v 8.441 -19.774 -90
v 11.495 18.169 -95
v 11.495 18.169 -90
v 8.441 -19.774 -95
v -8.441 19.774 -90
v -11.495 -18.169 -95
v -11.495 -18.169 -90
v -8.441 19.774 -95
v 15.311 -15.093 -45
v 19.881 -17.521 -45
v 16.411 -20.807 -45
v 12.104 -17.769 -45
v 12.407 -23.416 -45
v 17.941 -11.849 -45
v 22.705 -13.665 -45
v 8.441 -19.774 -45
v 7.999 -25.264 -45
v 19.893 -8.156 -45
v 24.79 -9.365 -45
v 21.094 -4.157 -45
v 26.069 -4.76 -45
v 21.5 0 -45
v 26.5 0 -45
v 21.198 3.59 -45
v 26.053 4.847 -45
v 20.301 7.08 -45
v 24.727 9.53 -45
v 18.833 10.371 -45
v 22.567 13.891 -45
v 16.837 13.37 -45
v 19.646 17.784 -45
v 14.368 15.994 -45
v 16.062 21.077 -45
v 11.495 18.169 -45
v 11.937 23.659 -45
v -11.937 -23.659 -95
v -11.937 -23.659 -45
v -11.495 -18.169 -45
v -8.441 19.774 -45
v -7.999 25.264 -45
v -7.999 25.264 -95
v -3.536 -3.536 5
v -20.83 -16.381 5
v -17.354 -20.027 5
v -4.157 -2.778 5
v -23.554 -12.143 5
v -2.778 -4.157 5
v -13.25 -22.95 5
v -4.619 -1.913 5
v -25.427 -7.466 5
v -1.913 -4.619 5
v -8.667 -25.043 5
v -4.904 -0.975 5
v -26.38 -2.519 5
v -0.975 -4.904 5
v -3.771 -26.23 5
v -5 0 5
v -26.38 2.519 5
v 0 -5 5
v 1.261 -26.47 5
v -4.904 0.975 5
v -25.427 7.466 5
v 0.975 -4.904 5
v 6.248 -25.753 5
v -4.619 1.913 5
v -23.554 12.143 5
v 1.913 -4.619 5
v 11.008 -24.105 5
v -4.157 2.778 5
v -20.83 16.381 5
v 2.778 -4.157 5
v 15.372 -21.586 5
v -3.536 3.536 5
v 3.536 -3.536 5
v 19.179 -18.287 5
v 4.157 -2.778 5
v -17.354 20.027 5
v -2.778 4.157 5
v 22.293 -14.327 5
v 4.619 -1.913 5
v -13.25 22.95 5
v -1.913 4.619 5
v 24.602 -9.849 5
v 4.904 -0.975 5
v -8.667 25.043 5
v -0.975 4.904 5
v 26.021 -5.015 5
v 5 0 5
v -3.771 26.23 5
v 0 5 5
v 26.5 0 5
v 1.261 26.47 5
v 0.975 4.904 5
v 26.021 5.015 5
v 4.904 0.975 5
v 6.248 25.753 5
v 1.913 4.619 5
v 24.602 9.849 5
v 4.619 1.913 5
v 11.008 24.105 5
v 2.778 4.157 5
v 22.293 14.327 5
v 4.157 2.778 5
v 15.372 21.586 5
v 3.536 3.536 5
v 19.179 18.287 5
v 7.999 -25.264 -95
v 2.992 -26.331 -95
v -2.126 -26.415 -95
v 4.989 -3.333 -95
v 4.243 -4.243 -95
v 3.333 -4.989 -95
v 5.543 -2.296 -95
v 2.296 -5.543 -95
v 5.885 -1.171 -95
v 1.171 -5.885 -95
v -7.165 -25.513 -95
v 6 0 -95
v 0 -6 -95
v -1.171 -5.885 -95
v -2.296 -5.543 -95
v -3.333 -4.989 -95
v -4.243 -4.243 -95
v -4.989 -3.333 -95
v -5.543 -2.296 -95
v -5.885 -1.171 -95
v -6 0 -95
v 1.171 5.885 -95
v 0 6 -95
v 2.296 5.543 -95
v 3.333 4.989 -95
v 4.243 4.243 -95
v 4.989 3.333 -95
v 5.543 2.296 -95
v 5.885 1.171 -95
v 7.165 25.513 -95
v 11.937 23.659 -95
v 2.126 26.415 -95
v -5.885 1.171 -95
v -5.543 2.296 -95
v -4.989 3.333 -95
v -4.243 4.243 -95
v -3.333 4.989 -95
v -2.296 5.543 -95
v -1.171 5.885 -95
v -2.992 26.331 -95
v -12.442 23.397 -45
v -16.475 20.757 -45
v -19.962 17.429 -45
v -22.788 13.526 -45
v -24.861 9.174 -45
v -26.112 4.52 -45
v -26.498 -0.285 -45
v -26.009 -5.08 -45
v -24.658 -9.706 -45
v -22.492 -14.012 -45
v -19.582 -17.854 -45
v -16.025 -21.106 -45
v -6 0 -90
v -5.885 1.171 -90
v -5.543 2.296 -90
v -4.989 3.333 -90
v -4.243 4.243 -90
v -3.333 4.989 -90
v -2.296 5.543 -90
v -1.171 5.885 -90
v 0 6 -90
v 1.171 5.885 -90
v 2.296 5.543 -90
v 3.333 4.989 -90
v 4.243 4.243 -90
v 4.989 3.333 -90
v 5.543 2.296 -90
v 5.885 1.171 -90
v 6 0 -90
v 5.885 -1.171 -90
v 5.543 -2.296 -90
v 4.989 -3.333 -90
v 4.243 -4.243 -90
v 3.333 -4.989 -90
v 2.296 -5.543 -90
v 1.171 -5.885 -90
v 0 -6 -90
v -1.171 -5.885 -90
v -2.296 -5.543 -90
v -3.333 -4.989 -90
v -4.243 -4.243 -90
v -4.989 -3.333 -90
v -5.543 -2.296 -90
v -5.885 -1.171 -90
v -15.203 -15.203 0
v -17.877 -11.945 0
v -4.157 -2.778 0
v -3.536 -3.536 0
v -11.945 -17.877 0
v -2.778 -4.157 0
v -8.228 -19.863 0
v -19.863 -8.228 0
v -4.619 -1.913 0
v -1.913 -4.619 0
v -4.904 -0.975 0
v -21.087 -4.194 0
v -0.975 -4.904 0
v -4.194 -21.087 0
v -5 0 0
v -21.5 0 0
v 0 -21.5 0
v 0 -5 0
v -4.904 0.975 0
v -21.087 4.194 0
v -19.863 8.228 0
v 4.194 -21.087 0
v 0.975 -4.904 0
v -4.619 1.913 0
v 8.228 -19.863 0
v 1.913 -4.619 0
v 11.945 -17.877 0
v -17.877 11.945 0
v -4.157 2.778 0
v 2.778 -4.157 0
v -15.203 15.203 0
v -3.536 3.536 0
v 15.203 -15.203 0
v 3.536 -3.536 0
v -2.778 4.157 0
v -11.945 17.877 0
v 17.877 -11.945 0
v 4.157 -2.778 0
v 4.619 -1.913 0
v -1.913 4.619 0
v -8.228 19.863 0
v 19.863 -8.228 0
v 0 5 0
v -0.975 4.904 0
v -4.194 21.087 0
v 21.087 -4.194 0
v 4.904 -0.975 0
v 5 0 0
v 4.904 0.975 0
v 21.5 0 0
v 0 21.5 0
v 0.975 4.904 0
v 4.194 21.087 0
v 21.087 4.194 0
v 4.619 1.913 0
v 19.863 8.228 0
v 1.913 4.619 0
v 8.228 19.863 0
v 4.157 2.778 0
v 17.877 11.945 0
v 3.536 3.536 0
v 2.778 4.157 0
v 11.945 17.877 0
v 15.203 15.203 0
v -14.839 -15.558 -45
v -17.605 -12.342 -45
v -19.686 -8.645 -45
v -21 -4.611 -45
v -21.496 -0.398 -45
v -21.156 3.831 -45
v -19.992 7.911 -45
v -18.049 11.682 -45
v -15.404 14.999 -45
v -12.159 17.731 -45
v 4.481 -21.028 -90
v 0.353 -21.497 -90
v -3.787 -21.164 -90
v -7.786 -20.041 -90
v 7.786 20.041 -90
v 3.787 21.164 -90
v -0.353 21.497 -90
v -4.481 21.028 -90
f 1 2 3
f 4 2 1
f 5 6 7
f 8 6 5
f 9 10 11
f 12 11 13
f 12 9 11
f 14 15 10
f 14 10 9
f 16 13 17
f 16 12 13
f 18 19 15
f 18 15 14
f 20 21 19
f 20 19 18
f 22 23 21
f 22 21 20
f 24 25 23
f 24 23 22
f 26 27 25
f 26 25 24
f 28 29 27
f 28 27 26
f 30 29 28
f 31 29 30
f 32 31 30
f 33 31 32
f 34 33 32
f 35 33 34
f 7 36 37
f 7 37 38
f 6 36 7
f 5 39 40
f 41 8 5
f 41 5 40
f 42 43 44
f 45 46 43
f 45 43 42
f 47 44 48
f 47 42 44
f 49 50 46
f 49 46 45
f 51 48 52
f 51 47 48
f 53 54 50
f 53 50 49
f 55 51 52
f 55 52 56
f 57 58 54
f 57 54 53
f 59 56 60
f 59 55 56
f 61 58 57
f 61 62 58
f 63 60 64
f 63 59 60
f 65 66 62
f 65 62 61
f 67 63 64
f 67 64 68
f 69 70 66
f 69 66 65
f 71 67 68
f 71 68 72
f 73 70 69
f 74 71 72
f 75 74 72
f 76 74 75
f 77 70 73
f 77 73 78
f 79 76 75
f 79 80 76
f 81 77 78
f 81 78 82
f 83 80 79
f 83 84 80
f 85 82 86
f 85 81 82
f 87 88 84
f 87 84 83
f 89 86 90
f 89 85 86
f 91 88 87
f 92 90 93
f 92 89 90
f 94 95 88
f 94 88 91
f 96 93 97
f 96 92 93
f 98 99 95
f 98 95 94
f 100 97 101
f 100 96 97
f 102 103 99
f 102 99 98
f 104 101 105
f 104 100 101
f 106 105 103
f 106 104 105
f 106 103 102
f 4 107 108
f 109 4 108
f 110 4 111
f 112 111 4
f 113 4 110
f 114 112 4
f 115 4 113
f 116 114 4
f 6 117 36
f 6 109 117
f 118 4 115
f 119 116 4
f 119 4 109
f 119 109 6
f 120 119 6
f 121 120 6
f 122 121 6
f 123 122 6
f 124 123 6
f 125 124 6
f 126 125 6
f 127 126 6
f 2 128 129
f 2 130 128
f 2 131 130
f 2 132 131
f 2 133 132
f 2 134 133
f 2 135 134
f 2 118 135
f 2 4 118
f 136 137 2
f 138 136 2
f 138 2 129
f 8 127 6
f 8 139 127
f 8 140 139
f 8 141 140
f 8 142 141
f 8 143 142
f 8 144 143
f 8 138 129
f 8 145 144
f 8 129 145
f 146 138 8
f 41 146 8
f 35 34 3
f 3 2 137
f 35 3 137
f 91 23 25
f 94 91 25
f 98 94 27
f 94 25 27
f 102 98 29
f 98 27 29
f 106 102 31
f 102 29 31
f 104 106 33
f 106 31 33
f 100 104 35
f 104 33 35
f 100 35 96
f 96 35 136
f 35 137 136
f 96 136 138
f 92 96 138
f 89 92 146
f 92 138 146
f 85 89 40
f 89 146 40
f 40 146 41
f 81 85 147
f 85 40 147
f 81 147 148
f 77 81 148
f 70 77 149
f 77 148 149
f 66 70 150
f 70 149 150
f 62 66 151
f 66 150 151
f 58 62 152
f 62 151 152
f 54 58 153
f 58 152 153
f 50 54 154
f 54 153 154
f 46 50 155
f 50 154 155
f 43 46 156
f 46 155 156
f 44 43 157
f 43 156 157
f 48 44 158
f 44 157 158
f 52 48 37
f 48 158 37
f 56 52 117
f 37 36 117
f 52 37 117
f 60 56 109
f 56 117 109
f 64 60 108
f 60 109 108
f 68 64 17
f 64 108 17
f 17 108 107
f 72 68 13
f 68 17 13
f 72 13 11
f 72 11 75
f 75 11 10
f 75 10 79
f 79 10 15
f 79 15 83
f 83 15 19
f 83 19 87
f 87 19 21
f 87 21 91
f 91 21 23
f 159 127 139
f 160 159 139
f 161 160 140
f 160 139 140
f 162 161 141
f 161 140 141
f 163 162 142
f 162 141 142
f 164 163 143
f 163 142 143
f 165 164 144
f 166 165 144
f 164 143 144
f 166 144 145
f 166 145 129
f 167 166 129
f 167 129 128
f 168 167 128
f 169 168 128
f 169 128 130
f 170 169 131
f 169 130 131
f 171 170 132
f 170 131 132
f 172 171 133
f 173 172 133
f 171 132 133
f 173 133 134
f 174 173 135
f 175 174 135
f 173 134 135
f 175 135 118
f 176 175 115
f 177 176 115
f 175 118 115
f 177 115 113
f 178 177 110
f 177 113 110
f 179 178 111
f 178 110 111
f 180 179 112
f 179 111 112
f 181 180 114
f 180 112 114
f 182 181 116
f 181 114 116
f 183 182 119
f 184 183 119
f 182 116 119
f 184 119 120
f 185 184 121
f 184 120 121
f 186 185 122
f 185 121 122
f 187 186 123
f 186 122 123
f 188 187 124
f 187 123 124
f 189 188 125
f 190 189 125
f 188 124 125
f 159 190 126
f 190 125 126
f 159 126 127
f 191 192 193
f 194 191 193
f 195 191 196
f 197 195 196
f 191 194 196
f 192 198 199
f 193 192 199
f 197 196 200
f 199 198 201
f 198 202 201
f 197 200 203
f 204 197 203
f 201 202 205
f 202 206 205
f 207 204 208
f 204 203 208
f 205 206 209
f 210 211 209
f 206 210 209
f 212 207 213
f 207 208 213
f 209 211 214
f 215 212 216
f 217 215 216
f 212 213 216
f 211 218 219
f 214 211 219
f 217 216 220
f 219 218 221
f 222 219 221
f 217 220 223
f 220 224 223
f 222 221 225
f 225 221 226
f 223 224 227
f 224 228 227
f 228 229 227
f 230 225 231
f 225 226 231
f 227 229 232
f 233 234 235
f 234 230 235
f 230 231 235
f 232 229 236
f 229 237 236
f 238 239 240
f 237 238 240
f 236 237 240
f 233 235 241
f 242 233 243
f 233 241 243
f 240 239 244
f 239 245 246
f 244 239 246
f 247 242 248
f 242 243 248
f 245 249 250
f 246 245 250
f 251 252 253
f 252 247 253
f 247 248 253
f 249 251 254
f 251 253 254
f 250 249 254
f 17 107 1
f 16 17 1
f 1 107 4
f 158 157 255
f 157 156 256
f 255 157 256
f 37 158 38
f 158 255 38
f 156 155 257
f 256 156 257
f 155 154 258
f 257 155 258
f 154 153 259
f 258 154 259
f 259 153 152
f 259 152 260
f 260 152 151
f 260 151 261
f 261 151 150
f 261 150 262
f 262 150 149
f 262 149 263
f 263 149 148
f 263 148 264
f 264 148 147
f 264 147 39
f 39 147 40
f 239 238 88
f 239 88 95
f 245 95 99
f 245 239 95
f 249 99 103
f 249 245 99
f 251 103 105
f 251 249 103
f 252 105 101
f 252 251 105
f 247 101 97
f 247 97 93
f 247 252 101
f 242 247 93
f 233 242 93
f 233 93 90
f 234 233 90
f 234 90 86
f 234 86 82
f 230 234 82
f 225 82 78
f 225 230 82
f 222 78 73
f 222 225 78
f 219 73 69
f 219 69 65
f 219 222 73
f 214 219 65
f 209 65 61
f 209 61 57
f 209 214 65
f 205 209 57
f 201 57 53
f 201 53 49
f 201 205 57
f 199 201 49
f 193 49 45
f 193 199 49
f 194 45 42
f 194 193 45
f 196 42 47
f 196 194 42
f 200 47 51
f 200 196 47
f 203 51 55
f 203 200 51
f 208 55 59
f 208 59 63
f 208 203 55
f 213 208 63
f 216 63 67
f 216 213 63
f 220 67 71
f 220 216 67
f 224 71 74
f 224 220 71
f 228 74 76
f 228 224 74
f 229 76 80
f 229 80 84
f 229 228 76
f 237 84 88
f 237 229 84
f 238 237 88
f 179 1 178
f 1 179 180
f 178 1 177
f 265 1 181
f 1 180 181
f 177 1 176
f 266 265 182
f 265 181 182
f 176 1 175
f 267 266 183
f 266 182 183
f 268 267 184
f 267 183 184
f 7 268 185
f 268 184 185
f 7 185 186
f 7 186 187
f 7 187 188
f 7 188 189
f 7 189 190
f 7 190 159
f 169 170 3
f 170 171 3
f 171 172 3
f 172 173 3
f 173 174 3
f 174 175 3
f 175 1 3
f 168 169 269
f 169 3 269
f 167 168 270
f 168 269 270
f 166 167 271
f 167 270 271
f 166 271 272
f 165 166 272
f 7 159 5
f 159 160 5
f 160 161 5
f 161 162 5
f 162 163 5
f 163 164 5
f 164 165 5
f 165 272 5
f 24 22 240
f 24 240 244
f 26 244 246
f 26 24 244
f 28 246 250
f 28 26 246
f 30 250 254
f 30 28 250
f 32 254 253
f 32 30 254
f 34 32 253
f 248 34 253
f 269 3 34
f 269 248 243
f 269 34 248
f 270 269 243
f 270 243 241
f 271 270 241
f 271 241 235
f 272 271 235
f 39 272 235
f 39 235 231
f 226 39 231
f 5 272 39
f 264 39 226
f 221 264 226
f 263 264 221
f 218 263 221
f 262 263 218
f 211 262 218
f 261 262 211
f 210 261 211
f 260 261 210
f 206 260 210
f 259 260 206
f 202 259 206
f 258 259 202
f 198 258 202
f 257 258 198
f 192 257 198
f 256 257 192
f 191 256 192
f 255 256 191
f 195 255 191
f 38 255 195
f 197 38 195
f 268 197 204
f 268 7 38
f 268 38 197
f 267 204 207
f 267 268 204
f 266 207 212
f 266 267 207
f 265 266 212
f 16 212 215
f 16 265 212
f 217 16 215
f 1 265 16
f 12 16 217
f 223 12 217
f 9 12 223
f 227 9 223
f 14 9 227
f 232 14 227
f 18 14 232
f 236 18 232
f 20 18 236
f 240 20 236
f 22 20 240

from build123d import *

# Parameters (mm, degrees)
SKETCH1_R           = 21.5
SKETCH1_R_2         = 5
BOSS_EXTRUDE1_DEPTH = 5
EXTRUDE_THIN1_START = -100
SKETCH2_R           = 26.5
SKETCH2_R_2         = 21.5
EXTRUDE_THIN1_DEPTH = 100
CUT_EXTRUDE1_DEPTH  = 50
BOSS_EXTRUDE2_DEPTH = 5
SKETCH5_R           = 6
CUT_EXTRUDE2_DEPTH  = 5


with BuildPart() as part:
    # Sketch1 → Boss-Extrude1 (new body)
    with BuildSketch(Plane.XY):
        Circle(SKETCH1_R)
        Circle(SKETCH1_R_2, mode=Mode.SUBTRACT)
    extrude(amount=BOSS_EXTRUDE1_DEPTH)

    # Sketch2 → Extrude-Thin1 (add)
    with BuildSketch(Plane.XY.offset(5).offset(EXTRUDE_THIN1_START)):
        Circle(SKETCH2_R)
        Circle(SKETCH2_R_2, mode=Mode.SUBTRACT)
    extrude(amount=EXTRUDE_THIN1_DEPTH)

    # Sketch3 → Cut-Extrude1 (cut)
    with BuildSketch(Plane(origin=(0, 0, -95), x_dir=(-1, 0, 0), z_dir=(0, 0, -1))):
        with BuildLine():
            Line((11.936744149, -23.659335137), (11.494827009, -18.169175876))
            ThreePointArc((11.494827009, -18.169175876), (21.430686769, 1.725011487), (8.440695566, 19.773837725))
            Line((8.440695566, 19.773837725), (7.998778427, 25.263996985))
            ThreePointArc((7.998778427, 25.263996985), (26.414567412, 2.126176949), (11.936744149, -23.659335137))
        make_face()
        with BuildLine():
            Line((-11.494827009, 18.169175876), (-11.936744149, 23.659335137))
            ThreePointArc((-11.936744149, 23.659335137), (-26.414567412, -2.126176949), (-7.998778427, -25.263996985))
            Line((-7.998778427, -25.263996985), (-8.440695566, -19.773837725))
            ThreePointArc((-8.440695566, -19.773837725), (-21.430686769, -1.725011487), (-11.494827009, 18.169175876))
        make_face()
    extrude(amount=-CUT_EXTRUDE1_DEPTH, mode=Mode.SUBTRACT)

    # Sketch4 → Boss-Extrude2 (add)
    with BuildSketch(Plane(origin=(0, 0, -95), x_dir=(-1, 0, 0), z_dir=(0, 0, -1))):
        with BuildLine():
            Line((-11.494827009, 18.169175876), (-8.440695566, -19.773837725))
            ThreePointArc((-8.440695566, -19.773837725), (1.725011487, -21.430686769), (11.494827009, -18.169175876))
            Line((11.494827009, -18.169175876), (8.440695566, 19.773837725))
            ThreePointArc((8.440695566, 19.773837725), (-1.725011487, 21.430686769), (-11.494827009, 18.169175876))
        make_face()
    extrude(amount=-BOSS_EXTRUDE2_DEPTH)

    # Sketch5 → Cut-Extrude2 (cut)
    with BuildSketch(Plane(origin=(0, 0, -95), x_dir=(-1, 0, 0), z_dir=(0, 0, -1))):
        Circle(SKETCH5_R)
    extrude(amount=-CUT_EXTRUDE2_DEPTH, mode=Mode.SUBTRACT)


solid = part.part
